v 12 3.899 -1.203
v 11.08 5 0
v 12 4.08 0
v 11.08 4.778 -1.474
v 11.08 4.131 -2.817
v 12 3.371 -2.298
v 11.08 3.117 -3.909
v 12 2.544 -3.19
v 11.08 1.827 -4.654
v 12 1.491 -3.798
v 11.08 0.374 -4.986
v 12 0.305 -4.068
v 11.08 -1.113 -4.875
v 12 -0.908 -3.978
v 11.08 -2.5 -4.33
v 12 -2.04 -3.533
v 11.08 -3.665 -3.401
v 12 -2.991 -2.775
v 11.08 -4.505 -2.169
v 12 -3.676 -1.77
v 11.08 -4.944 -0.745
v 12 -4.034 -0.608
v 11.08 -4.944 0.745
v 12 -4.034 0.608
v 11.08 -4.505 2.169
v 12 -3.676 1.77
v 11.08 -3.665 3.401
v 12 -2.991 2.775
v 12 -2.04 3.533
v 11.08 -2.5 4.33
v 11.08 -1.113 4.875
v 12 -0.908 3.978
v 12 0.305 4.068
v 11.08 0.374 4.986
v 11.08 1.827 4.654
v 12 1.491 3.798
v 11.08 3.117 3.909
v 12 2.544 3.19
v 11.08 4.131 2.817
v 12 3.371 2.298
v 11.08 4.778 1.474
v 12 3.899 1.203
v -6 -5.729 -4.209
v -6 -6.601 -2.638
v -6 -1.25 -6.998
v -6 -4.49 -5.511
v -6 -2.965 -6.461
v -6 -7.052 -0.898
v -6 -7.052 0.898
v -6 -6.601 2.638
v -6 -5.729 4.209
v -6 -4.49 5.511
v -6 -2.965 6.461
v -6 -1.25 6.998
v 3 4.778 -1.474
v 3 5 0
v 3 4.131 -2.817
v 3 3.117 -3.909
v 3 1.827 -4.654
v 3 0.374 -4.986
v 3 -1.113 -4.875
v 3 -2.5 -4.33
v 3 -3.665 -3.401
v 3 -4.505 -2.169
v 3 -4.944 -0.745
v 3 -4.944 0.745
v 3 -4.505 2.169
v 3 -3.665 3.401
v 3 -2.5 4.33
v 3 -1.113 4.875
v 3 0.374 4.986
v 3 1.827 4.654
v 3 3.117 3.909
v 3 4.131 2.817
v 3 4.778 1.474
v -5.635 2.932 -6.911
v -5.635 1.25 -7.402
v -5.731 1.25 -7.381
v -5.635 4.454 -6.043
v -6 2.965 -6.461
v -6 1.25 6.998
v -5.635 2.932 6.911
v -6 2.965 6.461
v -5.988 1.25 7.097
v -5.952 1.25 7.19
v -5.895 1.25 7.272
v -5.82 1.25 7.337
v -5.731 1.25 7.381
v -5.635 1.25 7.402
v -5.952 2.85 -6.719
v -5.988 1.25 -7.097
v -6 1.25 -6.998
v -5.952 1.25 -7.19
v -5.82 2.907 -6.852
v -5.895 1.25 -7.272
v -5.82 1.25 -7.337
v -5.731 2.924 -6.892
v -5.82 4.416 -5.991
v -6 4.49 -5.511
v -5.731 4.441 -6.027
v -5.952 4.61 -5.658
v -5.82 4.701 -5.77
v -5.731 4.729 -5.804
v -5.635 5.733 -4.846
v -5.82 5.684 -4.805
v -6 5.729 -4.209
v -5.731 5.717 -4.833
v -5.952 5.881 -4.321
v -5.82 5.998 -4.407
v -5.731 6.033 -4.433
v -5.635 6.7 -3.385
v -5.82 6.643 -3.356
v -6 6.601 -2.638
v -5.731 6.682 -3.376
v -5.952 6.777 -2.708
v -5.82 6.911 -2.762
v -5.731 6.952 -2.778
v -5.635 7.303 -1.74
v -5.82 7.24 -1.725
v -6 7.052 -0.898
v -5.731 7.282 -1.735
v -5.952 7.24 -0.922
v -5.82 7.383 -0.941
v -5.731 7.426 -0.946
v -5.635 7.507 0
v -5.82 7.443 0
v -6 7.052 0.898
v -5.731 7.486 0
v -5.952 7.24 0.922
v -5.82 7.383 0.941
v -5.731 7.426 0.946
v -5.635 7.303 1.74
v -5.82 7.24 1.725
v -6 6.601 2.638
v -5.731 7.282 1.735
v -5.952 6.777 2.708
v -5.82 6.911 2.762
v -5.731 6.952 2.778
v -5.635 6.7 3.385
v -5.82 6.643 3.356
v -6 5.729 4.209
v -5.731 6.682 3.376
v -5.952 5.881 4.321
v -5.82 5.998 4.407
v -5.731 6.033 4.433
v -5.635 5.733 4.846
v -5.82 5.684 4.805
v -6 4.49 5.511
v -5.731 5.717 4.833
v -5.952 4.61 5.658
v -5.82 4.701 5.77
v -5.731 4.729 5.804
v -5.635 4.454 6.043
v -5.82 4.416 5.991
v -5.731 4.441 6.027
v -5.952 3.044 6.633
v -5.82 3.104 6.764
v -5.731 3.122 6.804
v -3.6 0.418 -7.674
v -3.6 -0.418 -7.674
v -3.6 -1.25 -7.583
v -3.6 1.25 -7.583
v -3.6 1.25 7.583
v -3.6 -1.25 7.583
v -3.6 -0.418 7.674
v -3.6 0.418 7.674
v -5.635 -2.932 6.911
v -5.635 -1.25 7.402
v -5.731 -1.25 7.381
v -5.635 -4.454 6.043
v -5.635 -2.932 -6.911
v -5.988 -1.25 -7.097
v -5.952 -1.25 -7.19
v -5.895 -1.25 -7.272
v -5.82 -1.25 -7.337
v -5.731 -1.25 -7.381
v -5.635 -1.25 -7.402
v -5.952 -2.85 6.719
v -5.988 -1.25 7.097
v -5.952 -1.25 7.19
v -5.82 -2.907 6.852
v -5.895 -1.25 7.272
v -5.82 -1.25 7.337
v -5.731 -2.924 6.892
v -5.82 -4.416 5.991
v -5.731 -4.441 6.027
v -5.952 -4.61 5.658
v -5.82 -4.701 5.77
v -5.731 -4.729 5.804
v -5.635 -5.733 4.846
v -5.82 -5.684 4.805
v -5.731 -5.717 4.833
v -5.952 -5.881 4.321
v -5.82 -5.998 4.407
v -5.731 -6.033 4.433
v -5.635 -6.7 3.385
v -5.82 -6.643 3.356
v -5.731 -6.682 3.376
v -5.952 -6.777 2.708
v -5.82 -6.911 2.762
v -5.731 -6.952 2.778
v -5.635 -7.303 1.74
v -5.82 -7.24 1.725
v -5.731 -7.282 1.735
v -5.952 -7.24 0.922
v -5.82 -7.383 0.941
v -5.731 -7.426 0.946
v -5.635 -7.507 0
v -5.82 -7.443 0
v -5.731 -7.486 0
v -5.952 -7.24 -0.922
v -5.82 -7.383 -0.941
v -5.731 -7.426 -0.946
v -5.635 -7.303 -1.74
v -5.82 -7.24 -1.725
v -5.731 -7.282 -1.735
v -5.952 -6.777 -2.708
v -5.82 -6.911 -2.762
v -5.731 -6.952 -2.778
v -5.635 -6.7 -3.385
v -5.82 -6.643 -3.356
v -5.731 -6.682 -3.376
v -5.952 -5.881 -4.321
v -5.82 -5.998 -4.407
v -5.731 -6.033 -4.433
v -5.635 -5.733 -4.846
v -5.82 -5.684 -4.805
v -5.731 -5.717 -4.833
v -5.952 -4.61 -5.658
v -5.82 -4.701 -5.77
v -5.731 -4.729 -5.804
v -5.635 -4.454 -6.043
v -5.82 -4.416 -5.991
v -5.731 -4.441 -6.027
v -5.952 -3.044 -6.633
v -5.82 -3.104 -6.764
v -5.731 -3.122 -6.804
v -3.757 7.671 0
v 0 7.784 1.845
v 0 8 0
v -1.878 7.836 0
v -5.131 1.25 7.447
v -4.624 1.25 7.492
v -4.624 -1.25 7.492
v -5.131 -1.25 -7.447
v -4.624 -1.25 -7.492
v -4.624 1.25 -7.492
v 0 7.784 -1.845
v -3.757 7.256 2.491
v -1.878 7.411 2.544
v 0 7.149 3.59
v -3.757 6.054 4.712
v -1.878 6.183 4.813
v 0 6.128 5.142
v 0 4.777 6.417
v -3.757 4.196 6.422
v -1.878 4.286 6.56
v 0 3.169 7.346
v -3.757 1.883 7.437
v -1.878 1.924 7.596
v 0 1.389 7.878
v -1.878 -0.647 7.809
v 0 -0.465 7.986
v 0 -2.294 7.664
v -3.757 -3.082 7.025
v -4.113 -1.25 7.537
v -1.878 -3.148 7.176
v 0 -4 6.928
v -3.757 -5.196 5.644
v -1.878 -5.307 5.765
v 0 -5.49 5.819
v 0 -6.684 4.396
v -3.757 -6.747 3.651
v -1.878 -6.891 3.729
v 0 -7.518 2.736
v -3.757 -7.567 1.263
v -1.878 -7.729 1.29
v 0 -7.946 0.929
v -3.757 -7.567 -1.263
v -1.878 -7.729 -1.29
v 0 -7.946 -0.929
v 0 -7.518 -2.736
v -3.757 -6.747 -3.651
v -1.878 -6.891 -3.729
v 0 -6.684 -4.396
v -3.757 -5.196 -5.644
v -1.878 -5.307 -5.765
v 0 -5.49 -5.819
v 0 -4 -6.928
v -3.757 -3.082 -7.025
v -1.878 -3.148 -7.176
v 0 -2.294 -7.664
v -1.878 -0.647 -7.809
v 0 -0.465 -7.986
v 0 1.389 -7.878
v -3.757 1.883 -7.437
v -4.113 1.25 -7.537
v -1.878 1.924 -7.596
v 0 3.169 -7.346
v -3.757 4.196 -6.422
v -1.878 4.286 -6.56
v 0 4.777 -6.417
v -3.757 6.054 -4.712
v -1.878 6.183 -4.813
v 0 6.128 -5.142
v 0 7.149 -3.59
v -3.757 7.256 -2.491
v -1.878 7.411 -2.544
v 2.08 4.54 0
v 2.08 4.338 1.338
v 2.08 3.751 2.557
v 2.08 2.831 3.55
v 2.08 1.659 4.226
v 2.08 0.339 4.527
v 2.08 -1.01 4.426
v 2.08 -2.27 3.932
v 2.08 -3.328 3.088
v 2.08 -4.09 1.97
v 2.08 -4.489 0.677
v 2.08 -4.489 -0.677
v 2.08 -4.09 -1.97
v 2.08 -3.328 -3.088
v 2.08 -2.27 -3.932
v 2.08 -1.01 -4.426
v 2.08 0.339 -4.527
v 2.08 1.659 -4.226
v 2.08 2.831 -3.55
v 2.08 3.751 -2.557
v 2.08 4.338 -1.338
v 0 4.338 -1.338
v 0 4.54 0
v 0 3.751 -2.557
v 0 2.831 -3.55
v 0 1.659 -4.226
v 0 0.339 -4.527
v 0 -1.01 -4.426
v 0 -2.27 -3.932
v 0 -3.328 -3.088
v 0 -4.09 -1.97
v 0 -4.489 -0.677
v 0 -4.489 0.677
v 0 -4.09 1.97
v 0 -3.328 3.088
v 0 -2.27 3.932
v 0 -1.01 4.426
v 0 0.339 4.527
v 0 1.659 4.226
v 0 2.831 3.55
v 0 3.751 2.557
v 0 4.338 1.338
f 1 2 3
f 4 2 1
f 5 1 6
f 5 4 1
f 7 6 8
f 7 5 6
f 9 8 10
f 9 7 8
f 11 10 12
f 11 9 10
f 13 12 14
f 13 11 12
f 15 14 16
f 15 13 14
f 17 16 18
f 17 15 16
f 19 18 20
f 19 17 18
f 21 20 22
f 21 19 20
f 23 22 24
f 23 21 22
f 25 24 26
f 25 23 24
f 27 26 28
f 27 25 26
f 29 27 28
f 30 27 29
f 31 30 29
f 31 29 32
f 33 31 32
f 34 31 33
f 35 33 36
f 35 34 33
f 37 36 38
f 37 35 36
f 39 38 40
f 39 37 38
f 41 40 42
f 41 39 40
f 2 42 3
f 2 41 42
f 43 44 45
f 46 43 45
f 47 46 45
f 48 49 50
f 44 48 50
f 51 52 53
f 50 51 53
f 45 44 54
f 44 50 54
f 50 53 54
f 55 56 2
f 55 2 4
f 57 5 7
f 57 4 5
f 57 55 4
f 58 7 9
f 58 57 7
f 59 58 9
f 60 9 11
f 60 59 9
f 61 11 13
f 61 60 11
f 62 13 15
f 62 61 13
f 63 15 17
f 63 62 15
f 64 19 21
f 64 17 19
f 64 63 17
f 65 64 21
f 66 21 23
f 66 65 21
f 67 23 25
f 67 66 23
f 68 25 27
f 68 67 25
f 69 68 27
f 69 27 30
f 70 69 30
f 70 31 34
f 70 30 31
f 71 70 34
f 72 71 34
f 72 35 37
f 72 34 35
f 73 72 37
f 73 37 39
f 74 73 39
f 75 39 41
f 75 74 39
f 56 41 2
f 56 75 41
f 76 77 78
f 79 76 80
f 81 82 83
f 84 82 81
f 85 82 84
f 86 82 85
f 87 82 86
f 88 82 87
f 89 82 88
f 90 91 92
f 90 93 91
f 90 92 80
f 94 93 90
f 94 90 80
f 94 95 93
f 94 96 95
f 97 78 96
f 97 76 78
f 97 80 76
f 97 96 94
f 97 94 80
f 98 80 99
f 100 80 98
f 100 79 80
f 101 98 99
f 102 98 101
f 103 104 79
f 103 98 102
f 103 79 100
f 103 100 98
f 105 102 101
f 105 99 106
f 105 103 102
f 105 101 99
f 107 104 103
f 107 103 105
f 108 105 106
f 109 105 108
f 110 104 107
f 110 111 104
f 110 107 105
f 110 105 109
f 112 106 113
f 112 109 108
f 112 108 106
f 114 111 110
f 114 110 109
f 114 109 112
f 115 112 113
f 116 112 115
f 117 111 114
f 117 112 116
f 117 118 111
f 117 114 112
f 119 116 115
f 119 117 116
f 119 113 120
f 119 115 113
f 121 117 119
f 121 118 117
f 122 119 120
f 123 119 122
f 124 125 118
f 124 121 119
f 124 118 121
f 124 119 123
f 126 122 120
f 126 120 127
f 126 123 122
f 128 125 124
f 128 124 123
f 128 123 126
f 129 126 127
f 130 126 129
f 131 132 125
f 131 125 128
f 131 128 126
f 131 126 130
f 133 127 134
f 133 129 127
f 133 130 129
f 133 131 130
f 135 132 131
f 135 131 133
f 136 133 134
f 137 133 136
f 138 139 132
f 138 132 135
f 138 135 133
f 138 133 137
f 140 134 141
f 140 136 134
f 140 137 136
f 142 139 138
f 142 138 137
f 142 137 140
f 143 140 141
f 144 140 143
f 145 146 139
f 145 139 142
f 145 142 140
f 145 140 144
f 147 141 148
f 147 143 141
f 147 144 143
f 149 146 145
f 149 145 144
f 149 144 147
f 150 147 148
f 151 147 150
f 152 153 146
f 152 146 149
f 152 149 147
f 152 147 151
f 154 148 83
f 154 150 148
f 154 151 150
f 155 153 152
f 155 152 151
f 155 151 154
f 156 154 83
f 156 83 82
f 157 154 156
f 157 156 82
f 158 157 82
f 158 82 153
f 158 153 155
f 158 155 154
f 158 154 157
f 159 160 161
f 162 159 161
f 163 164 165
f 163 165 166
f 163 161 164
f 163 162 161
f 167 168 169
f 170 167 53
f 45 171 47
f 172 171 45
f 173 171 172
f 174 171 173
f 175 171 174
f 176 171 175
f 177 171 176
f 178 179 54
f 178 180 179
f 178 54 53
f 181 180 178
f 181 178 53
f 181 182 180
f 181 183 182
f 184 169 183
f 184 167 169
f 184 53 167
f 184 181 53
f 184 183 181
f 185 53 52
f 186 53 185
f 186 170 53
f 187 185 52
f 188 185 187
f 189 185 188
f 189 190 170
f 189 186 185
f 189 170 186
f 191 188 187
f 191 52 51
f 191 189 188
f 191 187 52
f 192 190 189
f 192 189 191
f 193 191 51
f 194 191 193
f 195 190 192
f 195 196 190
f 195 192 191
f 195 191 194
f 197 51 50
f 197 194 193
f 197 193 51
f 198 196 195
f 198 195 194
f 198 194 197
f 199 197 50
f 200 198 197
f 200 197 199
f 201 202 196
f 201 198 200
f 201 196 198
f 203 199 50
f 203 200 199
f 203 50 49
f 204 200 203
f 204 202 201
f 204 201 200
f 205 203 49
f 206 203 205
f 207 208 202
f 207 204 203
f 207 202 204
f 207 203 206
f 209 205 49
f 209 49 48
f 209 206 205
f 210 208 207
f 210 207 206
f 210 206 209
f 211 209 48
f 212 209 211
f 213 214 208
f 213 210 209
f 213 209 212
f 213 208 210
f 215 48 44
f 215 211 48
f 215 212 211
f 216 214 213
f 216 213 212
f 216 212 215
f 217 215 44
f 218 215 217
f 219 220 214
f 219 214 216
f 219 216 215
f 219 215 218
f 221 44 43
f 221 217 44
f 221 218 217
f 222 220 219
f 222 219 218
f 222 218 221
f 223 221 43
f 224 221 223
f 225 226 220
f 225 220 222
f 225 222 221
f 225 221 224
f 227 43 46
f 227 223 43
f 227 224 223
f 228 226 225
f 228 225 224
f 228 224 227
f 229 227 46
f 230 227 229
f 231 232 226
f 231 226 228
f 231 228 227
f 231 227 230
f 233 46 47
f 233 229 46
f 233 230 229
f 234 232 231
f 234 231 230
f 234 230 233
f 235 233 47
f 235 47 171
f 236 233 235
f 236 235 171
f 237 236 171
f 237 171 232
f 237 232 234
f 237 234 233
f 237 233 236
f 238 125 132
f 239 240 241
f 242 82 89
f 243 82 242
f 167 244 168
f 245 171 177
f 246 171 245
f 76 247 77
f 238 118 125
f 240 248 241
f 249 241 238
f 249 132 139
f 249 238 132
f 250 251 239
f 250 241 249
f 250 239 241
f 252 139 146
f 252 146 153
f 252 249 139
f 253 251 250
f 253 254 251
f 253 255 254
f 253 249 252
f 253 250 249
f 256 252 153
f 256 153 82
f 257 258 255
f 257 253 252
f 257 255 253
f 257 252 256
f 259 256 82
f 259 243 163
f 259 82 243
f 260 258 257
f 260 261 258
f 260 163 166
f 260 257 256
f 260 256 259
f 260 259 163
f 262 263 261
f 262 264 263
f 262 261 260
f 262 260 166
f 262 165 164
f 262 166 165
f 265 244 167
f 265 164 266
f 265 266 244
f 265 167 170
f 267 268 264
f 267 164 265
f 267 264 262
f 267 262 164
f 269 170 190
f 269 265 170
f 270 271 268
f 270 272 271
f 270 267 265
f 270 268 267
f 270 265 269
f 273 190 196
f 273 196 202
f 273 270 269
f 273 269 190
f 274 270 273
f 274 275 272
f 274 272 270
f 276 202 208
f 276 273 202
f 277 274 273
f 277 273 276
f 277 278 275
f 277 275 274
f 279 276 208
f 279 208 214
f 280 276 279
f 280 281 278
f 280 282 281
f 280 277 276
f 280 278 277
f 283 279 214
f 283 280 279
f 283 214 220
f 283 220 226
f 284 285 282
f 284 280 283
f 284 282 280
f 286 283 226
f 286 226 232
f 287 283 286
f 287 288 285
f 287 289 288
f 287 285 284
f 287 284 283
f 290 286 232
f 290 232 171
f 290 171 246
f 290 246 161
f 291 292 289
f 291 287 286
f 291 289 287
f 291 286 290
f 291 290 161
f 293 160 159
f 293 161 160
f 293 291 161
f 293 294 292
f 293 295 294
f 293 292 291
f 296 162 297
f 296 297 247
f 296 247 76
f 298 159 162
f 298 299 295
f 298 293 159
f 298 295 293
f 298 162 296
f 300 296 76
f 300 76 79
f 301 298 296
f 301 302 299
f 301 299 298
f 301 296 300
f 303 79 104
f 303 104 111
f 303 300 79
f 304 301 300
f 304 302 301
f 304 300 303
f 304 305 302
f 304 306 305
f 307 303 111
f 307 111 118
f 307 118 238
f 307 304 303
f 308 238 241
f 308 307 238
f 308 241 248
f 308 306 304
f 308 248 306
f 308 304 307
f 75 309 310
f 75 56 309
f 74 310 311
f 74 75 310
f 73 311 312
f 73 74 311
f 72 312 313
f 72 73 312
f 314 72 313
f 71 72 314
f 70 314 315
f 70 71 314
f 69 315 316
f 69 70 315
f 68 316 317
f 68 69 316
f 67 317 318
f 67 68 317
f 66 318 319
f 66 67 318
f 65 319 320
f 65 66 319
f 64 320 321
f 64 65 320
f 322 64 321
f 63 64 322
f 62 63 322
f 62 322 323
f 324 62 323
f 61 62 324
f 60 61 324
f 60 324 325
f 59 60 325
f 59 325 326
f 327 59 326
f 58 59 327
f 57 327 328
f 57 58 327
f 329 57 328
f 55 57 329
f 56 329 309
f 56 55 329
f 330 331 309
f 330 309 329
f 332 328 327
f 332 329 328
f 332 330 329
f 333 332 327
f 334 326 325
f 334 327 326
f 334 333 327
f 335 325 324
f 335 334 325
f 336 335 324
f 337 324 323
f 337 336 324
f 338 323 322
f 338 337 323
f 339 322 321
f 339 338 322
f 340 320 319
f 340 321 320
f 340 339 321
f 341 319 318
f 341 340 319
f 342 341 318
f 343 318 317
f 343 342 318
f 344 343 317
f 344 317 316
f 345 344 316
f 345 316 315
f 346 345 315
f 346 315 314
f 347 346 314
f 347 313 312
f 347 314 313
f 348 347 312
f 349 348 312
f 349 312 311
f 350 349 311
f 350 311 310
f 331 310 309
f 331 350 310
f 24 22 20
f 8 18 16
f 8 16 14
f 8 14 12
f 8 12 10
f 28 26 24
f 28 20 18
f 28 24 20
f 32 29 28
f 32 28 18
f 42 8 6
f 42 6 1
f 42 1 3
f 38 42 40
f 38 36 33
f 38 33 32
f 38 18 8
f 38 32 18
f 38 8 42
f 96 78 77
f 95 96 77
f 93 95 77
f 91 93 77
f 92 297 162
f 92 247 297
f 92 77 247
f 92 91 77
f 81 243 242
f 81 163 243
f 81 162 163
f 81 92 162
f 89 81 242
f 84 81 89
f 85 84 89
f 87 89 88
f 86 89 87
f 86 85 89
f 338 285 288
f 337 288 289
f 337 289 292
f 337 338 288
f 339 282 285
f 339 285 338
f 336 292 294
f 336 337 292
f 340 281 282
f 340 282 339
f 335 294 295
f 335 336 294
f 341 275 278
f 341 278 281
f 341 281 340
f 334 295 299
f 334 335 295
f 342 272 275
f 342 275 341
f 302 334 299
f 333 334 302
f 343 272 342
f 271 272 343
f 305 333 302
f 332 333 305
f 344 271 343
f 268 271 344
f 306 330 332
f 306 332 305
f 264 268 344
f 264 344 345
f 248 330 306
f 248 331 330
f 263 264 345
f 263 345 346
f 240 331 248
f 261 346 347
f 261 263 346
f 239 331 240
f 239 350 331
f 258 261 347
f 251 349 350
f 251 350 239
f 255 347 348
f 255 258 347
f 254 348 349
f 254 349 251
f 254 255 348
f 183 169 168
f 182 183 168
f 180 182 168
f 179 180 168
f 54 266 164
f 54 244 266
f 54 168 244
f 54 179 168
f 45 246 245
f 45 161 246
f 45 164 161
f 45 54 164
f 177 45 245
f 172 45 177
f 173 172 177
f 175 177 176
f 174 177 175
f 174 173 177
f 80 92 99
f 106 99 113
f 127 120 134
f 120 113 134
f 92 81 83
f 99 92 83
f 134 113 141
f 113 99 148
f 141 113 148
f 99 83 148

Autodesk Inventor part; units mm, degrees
ref_plane "YZ Plane" through (0, 0, 0) normal (1, 0, 0) x (0, 1, 0)
ref_plane "XZ Plane" through (0, 0, 0) normal (0, 1, 0) x (-1, 0, 0)
sketch "Szkic1" plane through (0, 0, 0) normal (0, 0, 1) x (1, 0, 0)
  line L0 (-6, 0) -> (12, 0)
  line L1 (12, 0) -> (12, 5)
  line L2 (12, 5) -> (3, 5)
  line L3 (3, 5) -> (2.0797, 4.54)
  line L4 (2.0797, 4.54) -> (0, 4.54)
  line L5 (0, 4.54) -> (0, 8)
  line L6 (-9.6, 0) -> (15.6, 0) projected
  line L7 (0, -1.6) -> (0, 9.6) projected
  line L8 (-6, 0) -> (-6, 7.4751)
  line L9 (0, 8) -> (-6, 7.4751)
  line L10 (3, 5) -> (0, 5) construction
  dimension "d0" = 12
  dimension "d1" = 9
  dimension "d2" = 0.9203
  dimension "d3" = 6
  dimension "d4" = 10
  dimension "d5" = 9.08
  dimension "d9" = 16
  dimension "d10" = 5
revolve "Bryła" add sketch "Szkic1" angle 360 about axis through (-6, 0, 0) along (1, 0, 0)
sketch "Szkic2" plane through (-6, 0, 0) normal (-1, 0, 0) x (0, 0, 1)
  circle A0 centre (0, 0) radius 8 projected
  line L0 (0, 0) -> (0, 7.4751) projected
  line L1 (-8, 1.25) -> (8, 1.25)
  line L2 (8, 1.25) -> (8, -1.25)
  line L3 (8, -1.25) -> (-8, -1.25)
  line L4 (-8, -1.25) -> (-8, 1.25)
  line L5 (-8, 0) -> (8, 0) construction
  line L6 (0, 1.25) -> (0, -1.25) construction
  dimension "d11" = 2.5
  dimension "d12" = 16
fillet "Zaokrąglenie1" radius 0.4 1 edges at (-6, -7.4751, 0)
extrude "Szczelina" cut sketch "Szkic2" against normal blind 2.4 contours A0 L3 L1 | L2 L3 A0 | A0 L1 L2 | A0 L4 L1 | L3 L4 A0
thread "Gwint" size "M10x1.5" class "6g" standard "ISO Metric profile" length 9
chamfer "Faza1" distance 0.9202 distance2 0.9203 1 edges at (12, -5, 0) measured on face at (12, -0.8193, 1.889)
ref_plane "Work Plane1" through (30.1625, 0, 0) normal (0, 0, -1) x (1, 0, 0)
equation "\"d11\" = SBR"
equation "\"d12\" = KOD"
equation "\"d14\" = RR"
equation "\"d19\" = STI"
equation "\"d15\" = GEL"
equation "\"d17\" = -0.5 * SPD + 0.5 * GD"
equation "\"d0\" = NLG"
equation "\"d1\" = GEL"
equation "\"d3\" = KOH"
equation "\"d4\" = GD"
equation "\"d5\" = BDM"
equation "\"d9\" = KOD"
equation "\"d10\" = KEWI"
equation "\"GD\" = NND"
equation "\"NLG\" = 12"
equation "\"GEL\" = 9"
equation "\"KOD\" = 16"
equation "\"KOH\" = 6"
equation "\"GAL\" = 0.61345 * PTC"
equation "\"SPD\" = NND - 1.2269 * PTC"
equation "\"BDM\" = 9.08"
equation "\"GUL\" = 0.61345 * PTC"
equation "\"RR\" = 0.4"
equation "\"SBR\" = 2.5"
equation "\"STI\" = 2.4"
equation "\"KEWI\" = 5deg"
equation "\"PTC\" = 1.5"
equation "\"TOA\" = 30deg"
equation "\"GD1\" = THREADDIA - 1.2269 * PTC"
equation "\"NND\" = 10"
equation "\"THREADDIA\" = 10"
properties part number "ISO 1207 - M10 x 12" material "Stal nierdzewna 440C"
